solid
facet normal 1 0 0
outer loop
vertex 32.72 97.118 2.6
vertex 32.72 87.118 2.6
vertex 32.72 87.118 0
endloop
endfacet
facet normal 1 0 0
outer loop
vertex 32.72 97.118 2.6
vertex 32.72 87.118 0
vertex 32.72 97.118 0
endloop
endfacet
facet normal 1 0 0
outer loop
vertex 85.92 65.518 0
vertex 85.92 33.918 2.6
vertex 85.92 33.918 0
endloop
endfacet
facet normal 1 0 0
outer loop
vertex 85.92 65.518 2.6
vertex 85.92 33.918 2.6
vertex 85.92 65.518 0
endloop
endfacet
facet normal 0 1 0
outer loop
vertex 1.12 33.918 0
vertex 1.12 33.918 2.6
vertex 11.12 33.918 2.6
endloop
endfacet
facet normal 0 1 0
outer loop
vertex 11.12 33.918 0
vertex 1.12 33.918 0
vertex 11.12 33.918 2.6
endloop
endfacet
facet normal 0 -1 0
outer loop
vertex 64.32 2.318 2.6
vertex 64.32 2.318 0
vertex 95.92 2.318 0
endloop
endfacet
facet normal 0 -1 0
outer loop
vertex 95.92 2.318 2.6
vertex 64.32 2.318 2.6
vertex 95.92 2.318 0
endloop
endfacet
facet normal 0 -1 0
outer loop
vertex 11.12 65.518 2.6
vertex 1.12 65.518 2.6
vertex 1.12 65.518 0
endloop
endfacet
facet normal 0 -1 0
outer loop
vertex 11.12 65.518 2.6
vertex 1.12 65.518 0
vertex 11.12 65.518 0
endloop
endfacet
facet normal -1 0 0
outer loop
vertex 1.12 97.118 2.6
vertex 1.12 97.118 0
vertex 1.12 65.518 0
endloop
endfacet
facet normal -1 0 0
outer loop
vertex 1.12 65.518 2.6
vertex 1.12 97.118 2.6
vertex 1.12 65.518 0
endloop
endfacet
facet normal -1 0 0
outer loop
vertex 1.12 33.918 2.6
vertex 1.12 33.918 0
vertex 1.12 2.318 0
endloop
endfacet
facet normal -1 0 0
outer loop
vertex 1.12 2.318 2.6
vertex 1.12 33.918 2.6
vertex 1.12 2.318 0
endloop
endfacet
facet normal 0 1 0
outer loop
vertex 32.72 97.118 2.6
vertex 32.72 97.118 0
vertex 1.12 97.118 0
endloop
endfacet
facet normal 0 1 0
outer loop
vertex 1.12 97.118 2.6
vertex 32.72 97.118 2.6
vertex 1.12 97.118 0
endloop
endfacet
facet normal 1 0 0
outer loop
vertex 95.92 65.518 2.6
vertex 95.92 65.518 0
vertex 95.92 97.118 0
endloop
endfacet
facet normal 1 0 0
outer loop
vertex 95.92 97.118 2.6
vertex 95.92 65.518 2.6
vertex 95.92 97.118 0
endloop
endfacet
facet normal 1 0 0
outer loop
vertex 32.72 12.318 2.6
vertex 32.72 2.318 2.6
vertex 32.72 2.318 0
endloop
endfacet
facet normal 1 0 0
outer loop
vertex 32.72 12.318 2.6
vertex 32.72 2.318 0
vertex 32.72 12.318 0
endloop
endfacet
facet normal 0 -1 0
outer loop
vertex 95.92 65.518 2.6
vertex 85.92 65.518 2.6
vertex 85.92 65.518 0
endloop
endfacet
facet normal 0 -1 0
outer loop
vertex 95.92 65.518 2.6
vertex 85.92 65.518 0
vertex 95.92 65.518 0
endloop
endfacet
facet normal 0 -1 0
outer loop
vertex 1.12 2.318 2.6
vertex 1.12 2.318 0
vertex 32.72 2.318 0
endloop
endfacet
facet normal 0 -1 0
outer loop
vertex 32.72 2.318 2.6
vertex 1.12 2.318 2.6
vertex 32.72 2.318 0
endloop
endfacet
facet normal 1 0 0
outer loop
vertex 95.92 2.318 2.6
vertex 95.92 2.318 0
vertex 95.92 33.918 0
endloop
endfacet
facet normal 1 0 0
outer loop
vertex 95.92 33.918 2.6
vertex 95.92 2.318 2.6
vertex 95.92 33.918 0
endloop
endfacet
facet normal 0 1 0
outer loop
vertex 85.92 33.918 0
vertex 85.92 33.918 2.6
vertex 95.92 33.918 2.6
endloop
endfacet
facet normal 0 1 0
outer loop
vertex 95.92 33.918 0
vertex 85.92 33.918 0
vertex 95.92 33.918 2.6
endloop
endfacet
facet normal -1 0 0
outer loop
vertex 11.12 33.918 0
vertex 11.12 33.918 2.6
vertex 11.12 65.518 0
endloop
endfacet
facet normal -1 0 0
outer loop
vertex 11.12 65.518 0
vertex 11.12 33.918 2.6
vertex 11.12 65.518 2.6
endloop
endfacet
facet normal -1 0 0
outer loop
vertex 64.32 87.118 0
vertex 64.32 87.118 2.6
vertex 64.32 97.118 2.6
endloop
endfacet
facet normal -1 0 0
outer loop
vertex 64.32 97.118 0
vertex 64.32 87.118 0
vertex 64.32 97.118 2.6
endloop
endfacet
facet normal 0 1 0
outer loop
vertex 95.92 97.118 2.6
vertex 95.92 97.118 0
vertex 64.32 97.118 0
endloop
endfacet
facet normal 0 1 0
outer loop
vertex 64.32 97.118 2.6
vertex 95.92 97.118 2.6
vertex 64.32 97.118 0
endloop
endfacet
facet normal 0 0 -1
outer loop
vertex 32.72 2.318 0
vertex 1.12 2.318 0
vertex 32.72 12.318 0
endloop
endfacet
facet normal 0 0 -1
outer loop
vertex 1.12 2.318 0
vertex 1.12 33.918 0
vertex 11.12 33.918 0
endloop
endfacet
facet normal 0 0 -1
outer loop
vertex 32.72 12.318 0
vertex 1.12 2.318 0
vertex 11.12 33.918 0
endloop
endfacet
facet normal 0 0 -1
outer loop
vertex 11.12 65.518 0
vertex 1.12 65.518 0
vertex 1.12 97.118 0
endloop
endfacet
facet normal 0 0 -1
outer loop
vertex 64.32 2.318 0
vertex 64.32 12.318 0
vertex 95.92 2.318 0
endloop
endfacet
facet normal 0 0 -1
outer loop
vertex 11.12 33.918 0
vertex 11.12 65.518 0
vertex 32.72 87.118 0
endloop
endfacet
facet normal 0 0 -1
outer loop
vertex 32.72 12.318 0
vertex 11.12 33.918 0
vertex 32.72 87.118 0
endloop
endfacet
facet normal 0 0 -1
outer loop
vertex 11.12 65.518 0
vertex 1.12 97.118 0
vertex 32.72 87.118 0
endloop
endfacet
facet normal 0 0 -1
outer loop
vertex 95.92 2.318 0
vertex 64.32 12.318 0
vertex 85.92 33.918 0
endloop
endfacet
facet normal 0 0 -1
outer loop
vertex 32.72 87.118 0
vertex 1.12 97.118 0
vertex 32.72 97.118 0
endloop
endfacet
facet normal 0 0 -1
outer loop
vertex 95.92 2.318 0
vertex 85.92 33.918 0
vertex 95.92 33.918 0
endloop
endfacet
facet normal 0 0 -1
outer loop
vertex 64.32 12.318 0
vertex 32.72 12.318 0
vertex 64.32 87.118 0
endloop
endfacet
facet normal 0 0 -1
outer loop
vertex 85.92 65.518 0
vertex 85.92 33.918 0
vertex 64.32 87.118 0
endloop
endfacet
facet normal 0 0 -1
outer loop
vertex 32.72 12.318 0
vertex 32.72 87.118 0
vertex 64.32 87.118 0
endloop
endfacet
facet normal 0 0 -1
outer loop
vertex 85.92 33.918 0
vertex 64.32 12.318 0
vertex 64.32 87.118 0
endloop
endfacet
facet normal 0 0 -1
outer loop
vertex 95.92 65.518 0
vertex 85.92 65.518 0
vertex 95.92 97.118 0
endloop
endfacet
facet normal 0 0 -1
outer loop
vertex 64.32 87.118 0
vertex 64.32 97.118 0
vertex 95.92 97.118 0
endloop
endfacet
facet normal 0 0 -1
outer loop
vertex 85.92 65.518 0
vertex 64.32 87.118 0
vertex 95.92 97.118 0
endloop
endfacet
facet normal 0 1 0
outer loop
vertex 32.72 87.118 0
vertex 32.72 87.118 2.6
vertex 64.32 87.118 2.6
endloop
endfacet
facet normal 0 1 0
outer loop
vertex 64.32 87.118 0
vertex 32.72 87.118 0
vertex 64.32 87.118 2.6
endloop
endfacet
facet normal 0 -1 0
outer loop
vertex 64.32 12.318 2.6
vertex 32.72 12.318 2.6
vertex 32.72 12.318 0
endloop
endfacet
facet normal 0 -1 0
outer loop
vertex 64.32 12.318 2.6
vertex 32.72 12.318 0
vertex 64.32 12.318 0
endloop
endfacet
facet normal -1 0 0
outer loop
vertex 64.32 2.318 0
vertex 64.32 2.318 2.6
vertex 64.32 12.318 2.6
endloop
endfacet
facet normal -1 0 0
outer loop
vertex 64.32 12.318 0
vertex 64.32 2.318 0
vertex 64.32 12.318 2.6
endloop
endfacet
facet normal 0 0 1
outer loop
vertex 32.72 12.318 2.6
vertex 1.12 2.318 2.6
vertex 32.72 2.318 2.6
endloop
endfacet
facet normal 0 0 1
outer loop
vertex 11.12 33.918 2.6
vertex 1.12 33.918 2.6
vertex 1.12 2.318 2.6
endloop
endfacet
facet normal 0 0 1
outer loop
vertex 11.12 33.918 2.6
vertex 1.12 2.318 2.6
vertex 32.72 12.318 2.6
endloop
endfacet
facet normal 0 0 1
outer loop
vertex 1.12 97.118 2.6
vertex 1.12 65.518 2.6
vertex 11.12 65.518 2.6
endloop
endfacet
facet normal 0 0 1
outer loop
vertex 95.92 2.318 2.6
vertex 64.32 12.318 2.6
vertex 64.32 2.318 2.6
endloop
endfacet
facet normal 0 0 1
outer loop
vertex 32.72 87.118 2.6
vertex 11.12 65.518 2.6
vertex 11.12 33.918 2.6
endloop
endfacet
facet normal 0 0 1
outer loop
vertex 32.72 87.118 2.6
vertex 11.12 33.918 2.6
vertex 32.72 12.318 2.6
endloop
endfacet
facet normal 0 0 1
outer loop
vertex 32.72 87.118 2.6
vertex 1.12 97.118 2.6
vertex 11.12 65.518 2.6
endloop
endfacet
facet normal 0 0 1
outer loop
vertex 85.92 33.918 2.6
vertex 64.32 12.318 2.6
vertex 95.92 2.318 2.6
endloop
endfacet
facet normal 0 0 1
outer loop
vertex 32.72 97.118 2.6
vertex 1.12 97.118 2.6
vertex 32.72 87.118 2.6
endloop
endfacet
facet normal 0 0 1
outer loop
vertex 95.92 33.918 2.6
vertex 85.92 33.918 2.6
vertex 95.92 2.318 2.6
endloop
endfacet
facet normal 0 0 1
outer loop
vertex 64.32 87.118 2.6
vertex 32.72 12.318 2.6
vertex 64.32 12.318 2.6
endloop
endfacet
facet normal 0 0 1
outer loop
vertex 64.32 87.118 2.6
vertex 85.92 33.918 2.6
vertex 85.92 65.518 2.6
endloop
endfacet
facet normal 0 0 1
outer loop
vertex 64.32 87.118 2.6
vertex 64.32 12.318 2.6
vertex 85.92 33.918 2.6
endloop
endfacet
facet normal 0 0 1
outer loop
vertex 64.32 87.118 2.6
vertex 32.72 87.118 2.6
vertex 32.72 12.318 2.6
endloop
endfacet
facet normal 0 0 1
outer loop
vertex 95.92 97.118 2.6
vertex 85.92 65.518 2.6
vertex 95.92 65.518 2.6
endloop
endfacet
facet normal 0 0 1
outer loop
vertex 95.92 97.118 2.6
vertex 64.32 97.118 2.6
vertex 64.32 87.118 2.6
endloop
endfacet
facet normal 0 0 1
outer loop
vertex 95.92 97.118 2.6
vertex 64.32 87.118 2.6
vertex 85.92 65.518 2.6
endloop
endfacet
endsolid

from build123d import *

# Parameters (mm, degrees)
BOSS_EXTRUDE1_DEPTH = 2.6
SKETCH2_W           = 10
SKETCH2_H           = 31.6
SKETCH2_W_2         = 31.6
SKETCH2_H_2         = 10
CUT_EXTRUDE1_DEPTH  = 3.6


with BuildPart() as part:
    # Sketch1 → Boss-Extrude1 (new body)
    with BuildSketch(Plane.XY):
        Polygon((1.120381921, 67.197647161), (1.120381921, 32.237647161), (1.120381921, 2.317647161), (31.040381921, 2.317647161), (66.000381921, 2.317647161), (95.920381921, 2.317647161), (95.920381921, 32.237647161), (95.920381921, 62.157647161), (95.920381921, 97.117647161), (60.960381921, 97.117647161), (31.040381921, 97.117647161), (1.120381921, 97.117647161), align=None)
    extrude(amount=BOSS_EXTRUDE1_DEPTH)

    # Sketch2 → Cut-Extrude1 (cut, through all)
    with BuildSketch(Plane.XY.offset(2.6)):
        with Locations((6.120381921, 49.717647161)):
            Rectangle(SKETCH2_W, SKETCH2_H)
        with Locations((90.920381921, 49.717647161)):
            Rectangle(SKETCH2_W, SKETCH2_H)
        with Locations((48.520381921, 92.117647161)):
            Rectangle(SKETCH2_W_2, SKETCH2_H_2)
        with Locations((48.520381921, 7.317647161)):
            Rectangle(SKETCH2_W_2, SKETCH2_H_2)
    extrude(amount=-CUT_EXTRUDE1_DEPTH, mode=Mode.SUBTRACT)


solid = part.part
